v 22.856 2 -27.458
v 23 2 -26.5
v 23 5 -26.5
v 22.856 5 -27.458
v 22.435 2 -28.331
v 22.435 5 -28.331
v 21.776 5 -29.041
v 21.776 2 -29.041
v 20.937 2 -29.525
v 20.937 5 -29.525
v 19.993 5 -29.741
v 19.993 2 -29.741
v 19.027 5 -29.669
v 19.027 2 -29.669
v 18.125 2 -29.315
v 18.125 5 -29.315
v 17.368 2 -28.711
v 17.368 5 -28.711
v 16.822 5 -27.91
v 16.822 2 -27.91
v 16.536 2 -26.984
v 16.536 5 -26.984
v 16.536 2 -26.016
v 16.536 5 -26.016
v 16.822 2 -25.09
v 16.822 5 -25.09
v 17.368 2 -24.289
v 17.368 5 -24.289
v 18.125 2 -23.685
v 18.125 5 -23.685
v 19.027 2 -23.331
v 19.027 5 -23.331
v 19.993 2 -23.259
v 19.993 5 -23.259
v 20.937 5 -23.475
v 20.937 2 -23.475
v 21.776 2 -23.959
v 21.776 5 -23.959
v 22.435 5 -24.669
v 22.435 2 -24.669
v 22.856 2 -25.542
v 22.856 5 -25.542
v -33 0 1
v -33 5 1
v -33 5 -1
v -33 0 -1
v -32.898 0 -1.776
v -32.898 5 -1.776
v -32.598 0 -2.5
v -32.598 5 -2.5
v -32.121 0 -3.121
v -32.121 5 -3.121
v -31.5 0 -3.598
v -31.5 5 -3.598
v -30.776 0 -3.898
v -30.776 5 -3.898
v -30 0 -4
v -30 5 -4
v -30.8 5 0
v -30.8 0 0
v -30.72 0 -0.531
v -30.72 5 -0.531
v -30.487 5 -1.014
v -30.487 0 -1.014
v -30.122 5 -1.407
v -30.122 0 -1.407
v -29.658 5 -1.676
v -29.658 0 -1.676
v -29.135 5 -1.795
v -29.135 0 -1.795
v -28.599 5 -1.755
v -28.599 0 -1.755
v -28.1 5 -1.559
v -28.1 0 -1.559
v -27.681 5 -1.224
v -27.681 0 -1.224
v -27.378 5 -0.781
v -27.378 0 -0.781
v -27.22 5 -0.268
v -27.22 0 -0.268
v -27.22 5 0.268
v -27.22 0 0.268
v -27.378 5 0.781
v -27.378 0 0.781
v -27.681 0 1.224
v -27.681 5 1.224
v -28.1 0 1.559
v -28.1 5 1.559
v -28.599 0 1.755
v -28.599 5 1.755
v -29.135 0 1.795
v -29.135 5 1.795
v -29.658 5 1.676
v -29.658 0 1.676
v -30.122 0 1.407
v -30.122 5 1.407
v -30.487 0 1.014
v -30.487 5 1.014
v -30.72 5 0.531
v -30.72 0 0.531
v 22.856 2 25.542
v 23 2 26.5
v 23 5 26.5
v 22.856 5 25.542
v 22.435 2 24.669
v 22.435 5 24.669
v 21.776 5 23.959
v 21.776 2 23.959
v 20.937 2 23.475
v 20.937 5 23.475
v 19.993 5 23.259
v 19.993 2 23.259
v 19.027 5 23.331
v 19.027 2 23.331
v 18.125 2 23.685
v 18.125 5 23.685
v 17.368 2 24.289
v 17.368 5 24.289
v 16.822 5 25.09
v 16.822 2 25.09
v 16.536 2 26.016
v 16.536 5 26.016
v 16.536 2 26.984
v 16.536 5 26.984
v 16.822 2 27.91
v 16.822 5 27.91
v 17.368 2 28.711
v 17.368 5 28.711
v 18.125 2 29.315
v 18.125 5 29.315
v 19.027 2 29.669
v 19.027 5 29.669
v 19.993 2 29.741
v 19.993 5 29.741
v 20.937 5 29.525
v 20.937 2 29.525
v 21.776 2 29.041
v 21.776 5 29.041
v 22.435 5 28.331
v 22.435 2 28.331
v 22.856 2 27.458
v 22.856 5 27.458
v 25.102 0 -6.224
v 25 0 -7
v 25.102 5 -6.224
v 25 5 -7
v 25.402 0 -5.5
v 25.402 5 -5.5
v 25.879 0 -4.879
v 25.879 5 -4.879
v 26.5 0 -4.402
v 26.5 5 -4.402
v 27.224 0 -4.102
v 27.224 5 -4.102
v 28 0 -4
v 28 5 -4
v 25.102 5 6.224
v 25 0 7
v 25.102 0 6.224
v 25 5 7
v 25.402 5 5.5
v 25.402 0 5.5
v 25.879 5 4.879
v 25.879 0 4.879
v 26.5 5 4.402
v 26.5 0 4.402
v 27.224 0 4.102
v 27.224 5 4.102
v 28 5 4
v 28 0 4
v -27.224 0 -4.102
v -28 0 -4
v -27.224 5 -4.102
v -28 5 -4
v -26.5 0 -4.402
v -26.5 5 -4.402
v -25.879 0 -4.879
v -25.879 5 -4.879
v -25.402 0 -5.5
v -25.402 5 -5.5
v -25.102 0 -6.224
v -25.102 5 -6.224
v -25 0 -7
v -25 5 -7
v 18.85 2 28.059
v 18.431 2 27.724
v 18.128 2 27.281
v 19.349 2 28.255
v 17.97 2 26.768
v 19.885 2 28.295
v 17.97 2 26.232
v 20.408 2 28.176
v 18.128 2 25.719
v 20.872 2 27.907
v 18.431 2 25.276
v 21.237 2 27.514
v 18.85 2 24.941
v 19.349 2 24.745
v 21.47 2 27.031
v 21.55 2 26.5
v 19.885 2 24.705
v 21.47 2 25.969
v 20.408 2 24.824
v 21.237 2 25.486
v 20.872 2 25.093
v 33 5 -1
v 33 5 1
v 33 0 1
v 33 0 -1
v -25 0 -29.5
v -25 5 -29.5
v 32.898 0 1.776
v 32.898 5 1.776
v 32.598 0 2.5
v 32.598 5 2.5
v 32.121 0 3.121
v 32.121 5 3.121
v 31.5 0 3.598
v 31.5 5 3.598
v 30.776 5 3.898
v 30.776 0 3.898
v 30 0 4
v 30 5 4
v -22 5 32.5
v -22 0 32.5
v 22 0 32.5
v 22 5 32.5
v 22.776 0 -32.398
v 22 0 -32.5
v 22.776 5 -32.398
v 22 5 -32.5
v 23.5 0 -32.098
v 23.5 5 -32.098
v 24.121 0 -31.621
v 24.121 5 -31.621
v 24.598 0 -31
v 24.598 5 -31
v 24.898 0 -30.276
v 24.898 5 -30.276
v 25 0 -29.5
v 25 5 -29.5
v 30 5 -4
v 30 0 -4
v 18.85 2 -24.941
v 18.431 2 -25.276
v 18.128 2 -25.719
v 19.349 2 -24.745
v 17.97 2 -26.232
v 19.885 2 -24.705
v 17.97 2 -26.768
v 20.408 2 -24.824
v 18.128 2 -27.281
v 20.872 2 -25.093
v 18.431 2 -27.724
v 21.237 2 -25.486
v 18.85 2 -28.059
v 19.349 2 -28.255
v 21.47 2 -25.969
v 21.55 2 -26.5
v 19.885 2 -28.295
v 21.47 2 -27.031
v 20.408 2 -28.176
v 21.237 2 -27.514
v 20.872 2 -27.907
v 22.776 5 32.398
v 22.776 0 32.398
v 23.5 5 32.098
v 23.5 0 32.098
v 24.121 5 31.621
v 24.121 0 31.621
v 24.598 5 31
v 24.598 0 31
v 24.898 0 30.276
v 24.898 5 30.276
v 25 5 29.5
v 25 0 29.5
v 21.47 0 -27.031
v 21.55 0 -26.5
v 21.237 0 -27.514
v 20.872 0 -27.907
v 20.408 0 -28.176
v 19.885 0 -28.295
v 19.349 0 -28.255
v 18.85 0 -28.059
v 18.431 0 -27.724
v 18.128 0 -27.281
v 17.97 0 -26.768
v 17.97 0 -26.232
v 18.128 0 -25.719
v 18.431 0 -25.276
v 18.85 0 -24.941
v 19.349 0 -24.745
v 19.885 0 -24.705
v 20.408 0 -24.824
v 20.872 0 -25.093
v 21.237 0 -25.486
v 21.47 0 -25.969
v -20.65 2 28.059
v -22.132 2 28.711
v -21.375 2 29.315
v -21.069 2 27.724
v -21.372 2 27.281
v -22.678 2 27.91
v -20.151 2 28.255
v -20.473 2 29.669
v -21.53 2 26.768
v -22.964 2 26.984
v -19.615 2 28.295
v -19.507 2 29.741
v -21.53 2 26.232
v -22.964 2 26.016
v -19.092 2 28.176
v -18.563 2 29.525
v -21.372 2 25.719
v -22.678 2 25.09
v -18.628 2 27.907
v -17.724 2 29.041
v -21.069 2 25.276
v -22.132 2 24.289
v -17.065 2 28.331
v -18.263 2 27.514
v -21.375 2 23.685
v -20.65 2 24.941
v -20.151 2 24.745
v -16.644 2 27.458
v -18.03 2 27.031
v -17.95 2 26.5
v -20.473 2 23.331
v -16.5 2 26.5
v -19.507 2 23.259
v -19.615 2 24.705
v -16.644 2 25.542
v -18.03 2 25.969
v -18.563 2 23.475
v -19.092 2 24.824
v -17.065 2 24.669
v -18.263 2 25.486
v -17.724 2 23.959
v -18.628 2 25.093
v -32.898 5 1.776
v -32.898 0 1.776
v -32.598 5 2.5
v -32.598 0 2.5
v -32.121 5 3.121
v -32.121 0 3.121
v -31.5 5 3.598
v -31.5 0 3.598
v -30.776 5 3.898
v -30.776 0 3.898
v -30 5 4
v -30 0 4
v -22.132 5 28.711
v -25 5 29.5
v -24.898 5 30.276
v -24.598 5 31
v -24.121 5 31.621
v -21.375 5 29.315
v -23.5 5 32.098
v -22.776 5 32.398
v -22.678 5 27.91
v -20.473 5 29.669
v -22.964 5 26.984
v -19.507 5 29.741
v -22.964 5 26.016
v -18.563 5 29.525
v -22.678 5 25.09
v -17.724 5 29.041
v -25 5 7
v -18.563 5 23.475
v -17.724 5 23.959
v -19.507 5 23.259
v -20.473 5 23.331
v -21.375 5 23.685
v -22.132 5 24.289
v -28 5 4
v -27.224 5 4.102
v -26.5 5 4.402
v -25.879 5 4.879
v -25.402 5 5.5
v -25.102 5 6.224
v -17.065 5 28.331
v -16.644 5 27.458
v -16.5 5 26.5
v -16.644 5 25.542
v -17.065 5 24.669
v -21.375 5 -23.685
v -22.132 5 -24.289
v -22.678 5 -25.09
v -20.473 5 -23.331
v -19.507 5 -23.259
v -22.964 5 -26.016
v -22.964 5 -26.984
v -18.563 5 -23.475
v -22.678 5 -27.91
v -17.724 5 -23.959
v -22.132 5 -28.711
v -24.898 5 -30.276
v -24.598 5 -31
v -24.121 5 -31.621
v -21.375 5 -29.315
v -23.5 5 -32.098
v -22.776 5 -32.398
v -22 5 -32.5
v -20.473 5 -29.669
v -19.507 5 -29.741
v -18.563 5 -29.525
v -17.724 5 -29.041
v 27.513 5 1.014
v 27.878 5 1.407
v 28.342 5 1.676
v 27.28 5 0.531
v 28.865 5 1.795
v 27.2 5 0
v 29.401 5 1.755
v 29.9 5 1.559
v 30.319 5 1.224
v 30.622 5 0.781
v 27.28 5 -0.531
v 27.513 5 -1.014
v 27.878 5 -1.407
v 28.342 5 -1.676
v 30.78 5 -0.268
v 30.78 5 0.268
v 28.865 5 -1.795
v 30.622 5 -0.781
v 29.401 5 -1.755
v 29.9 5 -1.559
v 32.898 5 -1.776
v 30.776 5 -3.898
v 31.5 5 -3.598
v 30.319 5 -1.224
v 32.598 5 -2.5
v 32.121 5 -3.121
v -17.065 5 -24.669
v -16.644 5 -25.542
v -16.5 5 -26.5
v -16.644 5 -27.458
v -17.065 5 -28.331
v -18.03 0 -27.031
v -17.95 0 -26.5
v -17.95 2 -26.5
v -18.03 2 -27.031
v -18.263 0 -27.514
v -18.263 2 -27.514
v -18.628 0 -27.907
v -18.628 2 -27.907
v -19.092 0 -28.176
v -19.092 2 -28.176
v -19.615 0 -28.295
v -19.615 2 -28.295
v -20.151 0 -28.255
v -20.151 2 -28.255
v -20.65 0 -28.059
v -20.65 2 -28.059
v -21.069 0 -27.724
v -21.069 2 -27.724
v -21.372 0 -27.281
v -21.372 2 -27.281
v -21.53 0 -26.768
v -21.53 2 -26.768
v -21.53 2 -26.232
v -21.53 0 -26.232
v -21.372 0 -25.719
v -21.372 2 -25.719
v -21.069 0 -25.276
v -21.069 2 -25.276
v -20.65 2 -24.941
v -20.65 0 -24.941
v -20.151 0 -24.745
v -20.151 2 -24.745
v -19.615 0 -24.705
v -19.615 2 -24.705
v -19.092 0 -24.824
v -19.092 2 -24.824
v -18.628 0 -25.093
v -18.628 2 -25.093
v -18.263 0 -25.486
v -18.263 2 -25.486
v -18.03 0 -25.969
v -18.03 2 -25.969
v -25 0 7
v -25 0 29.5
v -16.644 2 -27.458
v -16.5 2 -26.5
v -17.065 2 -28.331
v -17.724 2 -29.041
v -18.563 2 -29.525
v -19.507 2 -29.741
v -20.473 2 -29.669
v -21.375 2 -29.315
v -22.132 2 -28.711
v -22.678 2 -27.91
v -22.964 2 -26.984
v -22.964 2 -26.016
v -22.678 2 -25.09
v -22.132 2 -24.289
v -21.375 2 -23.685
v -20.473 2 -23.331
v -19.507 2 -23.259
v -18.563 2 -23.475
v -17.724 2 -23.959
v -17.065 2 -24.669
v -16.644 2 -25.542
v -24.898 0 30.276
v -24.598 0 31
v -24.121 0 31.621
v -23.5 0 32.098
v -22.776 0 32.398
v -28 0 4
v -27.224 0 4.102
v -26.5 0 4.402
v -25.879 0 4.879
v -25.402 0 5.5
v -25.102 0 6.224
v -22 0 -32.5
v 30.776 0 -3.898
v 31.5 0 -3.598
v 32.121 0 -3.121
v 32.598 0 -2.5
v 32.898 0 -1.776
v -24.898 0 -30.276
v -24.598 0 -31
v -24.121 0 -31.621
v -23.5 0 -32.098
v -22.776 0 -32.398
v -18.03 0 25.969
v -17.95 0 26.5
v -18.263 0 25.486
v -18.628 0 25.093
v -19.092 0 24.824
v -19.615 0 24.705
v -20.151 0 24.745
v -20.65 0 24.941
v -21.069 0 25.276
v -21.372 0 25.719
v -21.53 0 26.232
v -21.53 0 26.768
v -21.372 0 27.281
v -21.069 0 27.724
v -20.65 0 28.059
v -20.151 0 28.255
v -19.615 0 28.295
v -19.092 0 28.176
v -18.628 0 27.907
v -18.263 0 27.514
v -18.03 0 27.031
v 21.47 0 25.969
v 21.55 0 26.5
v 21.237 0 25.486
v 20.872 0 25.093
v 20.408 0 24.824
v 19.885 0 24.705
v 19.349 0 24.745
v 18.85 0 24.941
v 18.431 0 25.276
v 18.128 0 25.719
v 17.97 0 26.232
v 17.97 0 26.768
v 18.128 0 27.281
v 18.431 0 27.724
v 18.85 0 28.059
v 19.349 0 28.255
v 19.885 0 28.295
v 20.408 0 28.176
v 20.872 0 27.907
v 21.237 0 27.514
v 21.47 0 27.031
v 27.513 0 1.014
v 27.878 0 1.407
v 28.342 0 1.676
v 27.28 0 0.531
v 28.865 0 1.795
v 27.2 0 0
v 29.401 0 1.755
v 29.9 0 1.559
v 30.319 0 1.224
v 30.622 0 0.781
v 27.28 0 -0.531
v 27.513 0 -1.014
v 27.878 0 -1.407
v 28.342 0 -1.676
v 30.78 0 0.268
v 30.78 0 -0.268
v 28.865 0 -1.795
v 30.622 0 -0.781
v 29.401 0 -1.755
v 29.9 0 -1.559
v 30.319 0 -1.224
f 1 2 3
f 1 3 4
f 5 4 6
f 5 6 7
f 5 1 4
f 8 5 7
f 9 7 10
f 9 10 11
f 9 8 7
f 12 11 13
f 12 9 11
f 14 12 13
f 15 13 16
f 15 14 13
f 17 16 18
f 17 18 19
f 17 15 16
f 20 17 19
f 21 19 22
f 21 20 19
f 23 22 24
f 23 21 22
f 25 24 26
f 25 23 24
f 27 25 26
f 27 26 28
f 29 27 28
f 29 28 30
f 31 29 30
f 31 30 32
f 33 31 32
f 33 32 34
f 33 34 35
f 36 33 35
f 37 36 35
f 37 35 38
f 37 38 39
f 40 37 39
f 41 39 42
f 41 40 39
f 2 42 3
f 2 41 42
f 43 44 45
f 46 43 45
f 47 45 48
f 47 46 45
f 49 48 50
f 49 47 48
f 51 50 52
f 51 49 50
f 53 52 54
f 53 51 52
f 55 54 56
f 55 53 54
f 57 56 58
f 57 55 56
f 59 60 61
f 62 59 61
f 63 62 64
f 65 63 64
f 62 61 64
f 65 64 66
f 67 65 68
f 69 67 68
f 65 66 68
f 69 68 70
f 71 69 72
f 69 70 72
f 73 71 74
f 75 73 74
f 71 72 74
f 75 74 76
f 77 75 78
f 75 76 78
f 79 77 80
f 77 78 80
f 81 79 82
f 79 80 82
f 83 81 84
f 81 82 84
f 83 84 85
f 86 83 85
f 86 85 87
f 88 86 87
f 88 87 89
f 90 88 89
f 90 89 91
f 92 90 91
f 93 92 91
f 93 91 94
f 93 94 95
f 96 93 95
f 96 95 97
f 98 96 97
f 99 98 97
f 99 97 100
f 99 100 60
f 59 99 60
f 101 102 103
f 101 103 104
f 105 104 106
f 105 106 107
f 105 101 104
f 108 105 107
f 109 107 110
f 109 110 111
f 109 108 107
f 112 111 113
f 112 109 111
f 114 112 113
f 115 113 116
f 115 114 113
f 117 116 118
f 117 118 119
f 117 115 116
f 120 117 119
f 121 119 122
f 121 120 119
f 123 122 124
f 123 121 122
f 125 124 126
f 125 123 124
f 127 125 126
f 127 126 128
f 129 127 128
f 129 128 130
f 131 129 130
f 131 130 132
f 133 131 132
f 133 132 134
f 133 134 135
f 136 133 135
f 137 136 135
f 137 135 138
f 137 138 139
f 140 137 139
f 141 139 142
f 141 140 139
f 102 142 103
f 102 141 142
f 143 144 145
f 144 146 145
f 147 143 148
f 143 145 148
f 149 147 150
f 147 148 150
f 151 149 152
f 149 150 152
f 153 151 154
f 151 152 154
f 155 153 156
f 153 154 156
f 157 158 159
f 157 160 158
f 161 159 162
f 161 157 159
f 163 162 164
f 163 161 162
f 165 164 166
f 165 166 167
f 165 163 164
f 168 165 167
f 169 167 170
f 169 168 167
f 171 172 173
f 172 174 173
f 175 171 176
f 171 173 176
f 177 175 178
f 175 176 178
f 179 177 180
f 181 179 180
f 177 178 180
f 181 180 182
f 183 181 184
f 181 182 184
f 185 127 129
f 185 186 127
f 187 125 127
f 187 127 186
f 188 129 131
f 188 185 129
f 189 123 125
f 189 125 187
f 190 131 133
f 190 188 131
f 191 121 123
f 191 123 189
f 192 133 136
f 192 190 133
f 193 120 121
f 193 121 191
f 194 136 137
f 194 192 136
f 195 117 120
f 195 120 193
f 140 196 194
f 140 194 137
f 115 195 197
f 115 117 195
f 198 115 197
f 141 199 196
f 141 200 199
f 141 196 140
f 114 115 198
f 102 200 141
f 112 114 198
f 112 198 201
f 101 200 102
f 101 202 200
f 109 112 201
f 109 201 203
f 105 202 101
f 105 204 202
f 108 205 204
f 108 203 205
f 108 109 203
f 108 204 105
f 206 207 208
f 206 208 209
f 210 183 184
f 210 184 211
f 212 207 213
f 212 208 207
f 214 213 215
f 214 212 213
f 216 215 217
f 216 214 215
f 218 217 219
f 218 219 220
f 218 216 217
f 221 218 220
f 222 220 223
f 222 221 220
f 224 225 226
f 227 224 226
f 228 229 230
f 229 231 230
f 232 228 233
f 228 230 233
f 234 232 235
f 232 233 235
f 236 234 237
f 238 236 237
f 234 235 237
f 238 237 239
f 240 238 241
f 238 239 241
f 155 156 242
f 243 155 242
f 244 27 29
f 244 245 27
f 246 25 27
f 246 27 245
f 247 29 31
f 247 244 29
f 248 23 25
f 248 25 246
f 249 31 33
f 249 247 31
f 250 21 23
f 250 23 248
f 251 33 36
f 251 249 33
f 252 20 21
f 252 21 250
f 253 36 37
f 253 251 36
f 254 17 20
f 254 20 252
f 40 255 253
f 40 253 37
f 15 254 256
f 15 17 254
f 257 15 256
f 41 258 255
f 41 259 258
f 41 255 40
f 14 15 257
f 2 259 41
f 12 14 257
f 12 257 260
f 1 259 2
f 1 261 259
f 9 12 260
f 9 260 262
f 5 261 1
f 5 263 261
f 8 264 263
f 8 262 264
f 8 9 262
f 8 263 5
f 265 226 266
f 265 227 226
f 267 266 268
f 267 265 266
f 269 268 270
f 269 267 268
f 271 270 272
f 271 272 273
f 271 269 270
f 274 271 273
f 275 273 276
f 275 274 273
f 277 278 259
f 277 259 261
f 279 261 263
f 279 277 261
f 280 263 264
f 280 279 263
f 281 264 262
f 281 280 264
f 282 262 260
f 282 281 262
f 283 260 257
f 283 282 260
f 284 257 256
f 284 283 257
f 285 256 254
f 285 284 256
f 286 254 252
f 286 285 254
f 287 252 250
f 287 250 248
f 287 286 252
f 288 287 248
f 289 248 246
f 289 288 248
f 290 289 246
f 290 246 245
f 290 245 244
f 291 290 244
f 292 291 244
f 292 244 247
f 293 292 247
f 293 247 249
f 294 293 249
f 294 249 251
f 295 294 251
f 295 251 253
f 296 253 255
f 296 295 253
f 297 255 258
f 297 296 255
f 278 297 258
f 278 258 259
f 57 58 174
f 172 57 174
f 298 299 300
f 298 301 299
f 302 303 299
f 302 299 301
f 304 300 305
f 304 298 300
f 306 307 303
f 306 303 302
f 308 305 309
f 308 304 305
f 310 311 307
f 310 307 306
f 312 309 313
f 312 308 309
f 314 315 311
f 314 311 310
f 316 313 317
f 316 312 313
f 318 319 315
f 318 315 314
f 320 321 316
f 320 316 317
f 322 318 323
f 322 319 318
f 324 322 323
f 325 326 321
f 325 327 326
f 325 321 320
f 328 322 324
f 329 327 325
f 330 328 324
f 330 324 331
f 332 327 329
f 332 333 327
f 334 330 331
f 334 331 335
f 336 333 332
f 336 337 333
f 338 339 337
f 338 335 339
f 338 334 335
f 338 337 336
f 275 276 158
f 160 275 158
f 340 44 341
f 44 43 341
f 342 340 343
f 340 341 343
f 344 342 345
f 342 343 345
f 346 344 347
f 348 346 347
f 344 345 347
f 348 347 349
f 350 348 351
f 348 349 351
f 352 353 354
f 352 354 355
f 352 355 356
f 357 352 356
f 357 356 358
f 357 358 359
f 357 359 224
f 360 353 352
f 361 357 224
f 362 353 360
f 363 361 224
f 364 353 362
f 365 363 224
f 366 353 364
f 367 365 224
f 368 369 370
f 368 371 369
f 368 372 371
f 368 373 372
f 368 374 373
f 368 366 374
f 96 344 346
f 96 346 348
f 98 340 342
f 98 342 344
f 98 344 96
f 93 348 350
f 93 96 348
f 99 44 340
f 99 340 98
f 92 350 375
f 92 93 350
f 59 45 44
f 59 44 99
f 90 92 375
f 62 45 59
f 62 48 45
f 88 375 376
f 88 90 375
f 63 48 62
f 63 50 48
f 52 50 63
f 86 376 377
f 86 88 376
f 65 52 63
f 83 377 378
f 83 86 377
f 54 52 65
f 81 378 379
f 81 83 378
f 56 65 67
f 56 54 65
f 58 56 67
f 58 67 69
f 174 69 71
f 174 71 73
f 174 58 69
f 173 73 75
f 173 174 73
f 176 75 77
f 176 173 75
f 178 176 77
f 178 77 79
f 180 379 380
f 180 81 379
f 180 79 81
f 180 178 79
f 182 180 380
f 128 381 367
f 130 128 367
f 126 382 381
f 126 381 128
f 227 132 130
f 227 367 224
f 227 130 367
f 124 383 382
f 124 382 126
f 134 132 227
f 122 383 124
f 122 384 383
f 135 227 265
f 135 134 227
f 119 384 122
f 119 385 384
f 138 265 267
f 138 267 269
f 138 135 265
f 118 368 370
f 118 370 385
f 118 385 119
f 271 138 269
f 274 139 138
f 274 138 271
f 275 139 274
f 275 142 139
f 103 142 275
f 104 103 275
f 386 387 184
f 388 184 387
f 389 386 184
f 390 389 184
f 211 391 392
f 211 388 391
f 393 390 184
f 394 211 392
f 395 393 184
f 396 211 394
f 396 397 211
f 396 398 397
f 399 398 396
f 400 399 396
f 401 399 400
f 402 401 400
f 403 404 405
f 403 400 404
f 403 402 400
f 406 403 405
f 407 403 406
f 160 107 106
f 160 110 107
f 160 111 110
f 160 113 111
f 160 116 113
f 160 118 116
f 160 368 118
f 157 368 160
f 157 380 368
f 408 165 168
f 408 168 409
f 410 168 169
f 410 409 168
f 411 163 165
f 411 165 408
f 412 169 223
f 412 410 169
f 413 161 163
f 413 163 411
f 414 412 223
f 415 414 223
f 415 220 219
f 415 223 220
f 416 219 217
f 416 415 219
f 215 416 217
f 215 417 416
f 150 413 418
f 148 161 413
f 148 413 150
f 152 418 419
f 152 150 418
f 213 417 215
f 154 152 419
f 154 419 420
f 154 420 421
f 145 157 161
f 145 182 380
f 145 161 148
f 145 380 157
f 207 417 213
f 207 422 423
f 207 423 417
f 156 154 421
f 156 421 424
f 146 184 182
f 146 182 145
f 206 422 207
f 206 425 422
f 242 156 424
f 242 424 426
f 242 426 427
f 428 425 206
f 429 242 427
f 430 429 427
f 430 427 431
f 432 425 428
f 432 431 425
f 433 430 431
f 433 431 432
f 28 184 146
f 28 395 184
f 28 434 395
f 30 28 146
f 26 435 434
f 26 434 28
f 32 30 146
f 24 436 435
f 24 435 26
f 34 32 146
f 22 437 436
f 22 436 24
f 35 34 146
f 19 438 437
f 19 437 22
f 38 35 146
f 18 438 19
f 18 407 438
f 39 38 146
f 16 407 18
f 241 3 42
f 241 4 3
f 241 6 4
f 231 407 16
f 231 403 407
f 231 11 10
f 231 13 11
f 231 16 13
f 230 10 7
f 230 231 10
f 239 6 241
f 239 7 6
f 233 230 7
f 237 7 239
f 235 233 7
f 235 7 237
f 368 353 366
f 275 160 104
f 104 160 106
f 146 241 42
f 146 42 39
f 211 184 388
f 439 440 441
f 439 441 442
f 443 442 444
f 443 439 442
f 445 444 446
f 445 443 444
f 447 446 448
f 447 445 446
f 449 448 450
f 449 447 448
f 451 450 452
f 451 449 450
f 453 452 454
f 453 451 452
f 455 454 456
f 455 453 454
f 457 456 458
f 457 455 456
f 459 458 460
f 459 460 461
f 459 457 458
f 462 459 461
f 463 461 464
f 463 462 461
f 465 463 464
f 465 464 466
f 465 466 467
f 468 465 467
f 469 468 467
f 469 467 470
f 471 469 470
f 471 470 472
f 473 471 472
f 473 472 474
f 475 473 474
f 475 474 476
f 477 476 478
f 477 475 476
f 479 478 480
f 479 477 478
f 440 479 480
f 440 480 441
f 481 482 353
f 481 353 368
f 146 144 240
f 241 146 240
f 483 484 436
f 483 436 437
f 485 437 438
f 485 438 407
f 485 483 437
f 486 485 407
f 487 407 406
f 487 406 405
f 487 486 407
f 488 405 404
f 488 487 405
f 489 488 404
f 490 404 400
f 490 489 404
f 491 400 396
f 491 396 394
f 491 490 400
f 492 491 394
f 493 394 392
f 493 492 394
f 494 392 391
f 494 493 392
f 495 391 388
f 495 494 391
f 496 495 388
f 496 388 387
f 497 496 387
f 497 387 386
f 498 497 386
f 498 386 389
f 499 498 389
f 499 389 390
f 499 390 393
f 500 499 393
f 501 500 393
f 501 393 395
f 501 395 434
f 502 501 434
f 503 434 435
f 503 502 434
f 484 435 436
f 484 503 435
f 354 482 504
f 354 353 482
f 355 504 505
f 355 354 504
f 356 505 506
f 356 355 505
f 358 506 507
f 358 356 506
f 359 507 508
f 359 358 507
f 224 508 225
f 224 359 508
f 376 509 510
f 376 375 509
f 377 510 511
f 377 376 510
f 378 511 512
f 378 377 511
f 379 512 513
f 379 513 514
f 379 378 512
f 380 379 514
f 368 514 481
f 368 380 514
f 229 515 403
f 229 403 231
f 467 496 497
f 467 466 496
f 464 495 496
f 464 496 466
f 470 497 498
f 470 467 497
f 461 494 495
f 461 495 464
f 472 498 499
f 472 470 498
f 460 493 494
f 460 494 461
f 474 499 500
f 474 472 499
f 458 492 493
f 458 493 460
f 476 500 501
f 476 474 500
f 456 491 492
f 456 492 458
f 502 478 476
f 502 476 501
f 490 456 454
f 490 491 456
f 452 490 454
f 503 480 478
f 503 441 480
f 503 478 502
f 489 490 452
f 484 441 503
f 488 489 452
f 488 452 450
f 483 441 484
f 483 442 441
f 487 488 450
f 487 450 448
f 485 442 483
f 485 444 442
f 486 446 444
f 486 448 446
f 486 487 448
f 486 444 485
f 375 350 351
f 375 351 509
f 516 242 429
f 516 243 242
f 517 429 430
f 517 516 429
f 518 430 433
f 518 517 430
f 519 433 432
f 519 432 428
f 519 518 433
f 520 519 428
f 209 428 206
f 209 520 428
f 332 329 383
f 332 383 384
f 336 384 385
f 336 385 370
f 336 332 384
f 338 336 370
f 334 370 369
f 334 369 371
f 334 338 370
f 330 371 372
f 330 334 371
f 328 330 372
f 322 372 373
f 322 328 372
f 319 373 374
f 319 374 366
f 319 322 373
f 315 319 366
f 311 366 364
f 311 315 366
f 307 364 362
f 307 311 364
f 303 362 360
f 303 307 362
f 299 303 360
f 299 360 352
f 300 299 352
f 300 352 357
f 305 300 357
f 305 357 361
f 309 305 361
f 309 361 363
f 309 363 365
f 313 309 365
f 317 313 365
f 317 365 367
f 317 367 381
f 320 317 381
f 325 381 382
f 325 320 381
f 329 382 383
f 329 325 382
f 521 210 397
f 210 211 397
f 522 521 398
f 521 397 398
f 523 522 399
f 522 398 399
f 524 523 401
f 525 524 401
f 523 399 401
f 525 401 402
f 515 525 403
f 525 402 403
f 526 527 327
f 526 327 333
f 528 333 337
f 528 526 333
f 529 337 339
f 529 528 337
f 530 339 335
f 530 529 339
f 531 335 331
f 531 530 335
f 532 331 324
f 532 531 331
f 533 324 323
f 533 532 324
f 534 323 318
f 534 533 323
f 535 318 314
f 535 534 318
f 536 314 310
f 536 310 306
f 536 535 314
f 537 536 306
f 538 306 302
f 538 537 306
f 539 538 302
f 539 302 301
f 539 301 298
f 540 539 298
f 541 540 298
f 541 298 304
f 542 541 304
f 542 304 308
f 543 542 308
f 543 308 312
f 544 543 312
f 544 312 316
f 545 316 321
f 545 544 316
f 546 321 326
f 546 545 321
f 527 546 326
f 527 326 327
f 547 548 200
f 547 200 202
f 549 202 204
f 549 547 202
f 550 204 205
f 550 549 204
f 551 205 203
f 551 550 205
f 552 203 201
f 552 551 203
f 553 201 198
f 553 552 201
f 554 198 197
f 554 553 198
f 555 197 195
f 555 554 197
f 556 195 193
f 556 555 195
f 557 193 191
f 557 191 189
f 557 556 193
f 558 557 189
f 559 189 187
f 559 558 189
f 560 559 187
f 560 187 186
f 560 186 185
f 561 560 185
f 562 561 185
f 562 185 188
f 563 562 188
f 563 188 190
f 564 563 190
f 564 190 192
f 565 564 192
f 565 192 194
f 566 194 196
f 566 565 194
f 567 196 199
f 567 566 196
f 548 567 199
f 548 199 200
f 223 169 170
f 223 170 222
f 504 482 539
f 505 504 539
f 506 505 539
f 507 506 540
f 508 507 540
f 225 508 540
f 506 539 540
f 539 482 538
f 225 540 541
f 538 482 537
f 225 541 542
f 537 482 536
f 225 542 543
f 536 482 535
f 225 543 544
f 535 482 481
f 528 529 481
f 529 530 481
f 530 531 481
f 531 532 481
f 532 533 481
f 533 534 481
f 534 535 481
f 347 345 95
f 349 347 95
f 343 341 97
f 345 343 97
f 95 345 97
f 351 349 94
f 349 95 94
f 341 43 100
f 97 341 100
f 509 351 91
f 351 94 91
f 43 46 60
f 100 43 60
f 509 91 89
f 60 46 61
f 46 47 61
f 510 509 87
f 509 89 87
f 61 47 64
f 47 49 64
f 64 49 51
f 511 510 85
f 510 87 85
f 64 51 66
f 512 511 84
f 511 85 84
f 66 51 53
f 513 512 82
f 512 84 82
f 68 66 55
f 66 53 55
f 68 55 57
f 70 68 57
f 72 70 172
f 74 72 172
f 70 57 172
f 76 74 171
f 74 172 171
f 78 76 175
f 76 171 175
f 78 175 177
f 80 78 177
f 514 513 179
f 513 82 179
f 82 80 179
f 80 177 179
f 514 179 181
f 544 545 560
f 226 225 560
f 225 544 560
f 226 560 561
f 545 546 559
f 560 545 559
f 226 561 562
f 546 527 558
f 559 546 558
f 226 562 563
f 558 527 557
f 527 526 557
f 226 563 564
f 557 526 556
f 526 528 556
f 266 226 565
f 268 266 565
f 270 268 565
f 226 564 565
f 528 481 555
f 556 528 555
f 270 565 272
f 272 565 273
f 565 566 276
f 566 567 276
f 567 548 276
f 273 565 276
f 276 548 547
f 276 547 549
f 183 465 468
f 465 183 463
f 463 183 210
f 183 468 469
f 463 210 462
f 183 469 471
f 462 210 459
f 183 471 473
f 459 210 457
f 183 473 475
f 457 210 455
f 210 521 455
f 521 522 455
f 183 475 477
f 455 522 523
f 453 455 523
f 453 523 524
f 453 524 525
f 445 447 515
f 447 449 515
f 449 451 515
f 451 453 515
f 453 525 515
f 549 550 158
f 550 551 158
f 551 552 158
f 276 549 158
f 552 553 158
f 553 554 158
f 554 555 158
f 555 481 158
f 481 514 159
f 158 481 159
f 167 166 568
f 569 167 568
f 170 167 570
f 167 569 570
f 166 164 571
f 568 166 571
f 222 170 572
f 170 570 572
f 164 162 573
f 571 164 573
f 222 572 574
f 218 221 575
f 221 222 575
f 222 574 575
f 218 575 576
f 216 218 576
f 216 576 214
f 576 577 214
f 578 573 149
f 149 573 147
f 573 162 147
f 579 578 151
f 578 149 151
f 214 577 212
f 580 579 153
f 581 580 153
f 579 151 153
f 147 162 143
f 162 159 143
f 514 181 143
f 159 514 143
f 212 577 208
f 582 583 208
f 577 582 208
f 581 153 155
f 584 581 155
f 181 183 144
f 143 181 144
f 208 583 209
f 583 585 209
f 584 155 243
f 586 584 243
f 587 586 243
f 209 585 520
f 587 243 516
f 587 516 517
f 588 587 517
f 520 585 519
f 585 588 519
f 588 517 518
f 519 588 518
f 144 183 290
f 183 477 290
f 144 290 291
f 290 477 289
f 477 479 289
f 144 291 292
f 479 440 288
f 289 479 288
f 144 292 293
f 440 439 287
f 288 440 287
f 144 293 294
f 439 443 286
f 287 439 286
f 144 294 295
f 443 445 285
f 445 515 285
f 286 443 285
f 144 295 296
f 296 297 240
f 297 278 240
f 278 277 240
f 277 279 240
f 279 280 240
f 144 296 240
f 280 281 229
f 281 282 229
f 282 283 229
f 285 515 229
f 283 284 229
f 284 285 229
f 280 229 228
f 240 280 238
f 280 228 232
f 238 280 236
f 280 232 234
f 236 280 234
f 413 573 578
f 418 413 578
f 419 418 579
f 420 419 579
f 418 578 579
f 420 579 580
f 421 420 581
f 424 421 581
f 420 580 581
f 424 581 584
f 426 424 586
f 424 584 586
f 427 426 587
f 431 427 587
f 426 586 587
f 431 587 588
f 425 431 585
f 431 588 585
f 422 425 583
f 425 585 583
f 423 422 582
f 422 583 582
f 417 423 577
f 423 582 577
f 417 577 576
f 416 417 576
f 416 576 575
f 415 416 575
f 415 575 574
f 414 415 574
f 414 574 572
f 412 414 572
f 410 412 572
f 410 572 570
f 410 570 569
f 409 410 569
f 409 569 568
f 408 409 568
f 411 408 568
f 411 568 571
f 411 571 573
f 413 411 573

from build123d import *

# Parameters (mm, degrees)
SKETCH1_W                      = 50
SKETCH1_H                      = 65
BOSS_EXTRUDE1_DEPTH            = 5
CBORE_START                    = 2
CBORE_FOR_M3_SHCS1_OUTLINE_R   = 3.25
CBORE_FOR_M3_SHCS1_DEPTH       = 3
CBORE_FOR_M3_SHCS1_2_OUTLINE_R = 1.8
CBORE_FOR_M3_SHCS1_2_DEPTH     = 2
SKETCH5_W                      = 66
SKETCH5_H                      = 8
BOSS_EXTRUDE2_DEPTH            = 5
FILLET1_R                      = 3
M3_CLEARANCE_HOLE1_D           = 3.6


# Read off the part's stored shape, not the designer's step: CBORE for M3 SHCS1
with BuildPart() as part:
    # Sketch1 → Boss-Extrude1 (new body)
    with BuildSketch(Plane(origin=(0, 0, 0), x_dir=(1, 0, 0), z_dir=(0, 1, 0))):
        Rectangle(SKETCH1_W, SKETCH1_H)
    extrude(amount=BOSS_EXTRUDE1_DEPTH)

    # CBORE for M3 SHCS1 outline → CBORE for M3 SHCS1 (cut)
    with BuildSketch(Plane(origin=(0, 0, 0), x_dir=(1, 0, 0), z_dir=(0, 1, 0)).offset(CBORE_START)):
        with Locations((19.75, -26.5)):
            Circle(CBORE_FOR_M3_SHCS1_OUTLINE_R)
        with Locations((-19.75, 26.5)):
            Circle(CBORE_FOR_M3_SHCS1_OUTLINE_R)
        with Locations((-19.75, -26.5)):
            Circle(CBORE_FOR_M3_SHCS1_OUTLINE_R)
        with Locations((19.75, 26.5)):
            Circle(CBORE_FOR_M3_SHCS1_OUTLINE_R)
    extrude(amount=CBORE_FOR_M3_SHCS1_DEPTH, mode=Mode.SUBTRACT)

    # CBORE for M3 SHCS1 2 outline → CBORE for M3 SHCS1 2 (cut)
    with BuildSketch(Plane(origin=(0, 0, 0), x_dir=(1, 0, 0), z_dir=(0, 1, 0))):
        with Locations((19.75, -26.5)):
            Circle(CBORE_FOR_M3_SHCS1_2_OUTLINE_R)
        with Locations((-19.75, 26.5)):
            Circle(CBORE_FOR_M3_SHCS1_2_OUTLINE_R)
        with Locations((-19.75, -26.5)):
            Circle(CBORE_FOR_M3_SHCS1_2_OUTLINE_R)
        with Locations((19.75, 26.5)):
            Circle(CBORE_FOR_M3_SHCS1_2_OUTLINE_R)
    extrude(amount=CBORE_FOR_M3_SHCS1_2_DEPTH, mode=Mode.SUBTRACT)

    # Sketch5 → Boss-Extrude2 (add)
    with BuildSketch(Plane(origin=(0, 5, 0), x_dir=(1, 0, 0), z_dir=(0, 1, 0))):
        Rectangle(SKETCH5_W, SKETCH5_H)
    extrude(amount=-BOSS_EXTRUDE2_DEPTH)

    # Fillet1
    fillet1_edges = [part.edges().sort_by_distance(p)[0] for p in [
        (33, 2.5, 4),
        (-33, 2.5, -4),
        (33, 2.5, -4),
        (25, 2.5, 4),
        (-25, 2.5, 4),
        (-33, 2.5, 4),
        (25, 2.5, -4),
        (-25, 2.5, -4),
        (25, 2.5, 32.5),
        (-25, 2.5, 32.5),
        (-25, 2.5, -32.5),
        (25, 2.5, -32.5),
    ]]
    fillet(fillet1_edges, radius=FILLET1_R)

    # M3 Clearance Hole1 (through all)
    with Locations(Plane(origin=(0, 5, 0), x_dir=(1, 0, 0), z_dir=(0, 1, 0))):
        with Locations((-29, 0), (29, 0)):
            Hole(M3_CLEARANCE_HOLE1_D / 2)


solid = part.part
